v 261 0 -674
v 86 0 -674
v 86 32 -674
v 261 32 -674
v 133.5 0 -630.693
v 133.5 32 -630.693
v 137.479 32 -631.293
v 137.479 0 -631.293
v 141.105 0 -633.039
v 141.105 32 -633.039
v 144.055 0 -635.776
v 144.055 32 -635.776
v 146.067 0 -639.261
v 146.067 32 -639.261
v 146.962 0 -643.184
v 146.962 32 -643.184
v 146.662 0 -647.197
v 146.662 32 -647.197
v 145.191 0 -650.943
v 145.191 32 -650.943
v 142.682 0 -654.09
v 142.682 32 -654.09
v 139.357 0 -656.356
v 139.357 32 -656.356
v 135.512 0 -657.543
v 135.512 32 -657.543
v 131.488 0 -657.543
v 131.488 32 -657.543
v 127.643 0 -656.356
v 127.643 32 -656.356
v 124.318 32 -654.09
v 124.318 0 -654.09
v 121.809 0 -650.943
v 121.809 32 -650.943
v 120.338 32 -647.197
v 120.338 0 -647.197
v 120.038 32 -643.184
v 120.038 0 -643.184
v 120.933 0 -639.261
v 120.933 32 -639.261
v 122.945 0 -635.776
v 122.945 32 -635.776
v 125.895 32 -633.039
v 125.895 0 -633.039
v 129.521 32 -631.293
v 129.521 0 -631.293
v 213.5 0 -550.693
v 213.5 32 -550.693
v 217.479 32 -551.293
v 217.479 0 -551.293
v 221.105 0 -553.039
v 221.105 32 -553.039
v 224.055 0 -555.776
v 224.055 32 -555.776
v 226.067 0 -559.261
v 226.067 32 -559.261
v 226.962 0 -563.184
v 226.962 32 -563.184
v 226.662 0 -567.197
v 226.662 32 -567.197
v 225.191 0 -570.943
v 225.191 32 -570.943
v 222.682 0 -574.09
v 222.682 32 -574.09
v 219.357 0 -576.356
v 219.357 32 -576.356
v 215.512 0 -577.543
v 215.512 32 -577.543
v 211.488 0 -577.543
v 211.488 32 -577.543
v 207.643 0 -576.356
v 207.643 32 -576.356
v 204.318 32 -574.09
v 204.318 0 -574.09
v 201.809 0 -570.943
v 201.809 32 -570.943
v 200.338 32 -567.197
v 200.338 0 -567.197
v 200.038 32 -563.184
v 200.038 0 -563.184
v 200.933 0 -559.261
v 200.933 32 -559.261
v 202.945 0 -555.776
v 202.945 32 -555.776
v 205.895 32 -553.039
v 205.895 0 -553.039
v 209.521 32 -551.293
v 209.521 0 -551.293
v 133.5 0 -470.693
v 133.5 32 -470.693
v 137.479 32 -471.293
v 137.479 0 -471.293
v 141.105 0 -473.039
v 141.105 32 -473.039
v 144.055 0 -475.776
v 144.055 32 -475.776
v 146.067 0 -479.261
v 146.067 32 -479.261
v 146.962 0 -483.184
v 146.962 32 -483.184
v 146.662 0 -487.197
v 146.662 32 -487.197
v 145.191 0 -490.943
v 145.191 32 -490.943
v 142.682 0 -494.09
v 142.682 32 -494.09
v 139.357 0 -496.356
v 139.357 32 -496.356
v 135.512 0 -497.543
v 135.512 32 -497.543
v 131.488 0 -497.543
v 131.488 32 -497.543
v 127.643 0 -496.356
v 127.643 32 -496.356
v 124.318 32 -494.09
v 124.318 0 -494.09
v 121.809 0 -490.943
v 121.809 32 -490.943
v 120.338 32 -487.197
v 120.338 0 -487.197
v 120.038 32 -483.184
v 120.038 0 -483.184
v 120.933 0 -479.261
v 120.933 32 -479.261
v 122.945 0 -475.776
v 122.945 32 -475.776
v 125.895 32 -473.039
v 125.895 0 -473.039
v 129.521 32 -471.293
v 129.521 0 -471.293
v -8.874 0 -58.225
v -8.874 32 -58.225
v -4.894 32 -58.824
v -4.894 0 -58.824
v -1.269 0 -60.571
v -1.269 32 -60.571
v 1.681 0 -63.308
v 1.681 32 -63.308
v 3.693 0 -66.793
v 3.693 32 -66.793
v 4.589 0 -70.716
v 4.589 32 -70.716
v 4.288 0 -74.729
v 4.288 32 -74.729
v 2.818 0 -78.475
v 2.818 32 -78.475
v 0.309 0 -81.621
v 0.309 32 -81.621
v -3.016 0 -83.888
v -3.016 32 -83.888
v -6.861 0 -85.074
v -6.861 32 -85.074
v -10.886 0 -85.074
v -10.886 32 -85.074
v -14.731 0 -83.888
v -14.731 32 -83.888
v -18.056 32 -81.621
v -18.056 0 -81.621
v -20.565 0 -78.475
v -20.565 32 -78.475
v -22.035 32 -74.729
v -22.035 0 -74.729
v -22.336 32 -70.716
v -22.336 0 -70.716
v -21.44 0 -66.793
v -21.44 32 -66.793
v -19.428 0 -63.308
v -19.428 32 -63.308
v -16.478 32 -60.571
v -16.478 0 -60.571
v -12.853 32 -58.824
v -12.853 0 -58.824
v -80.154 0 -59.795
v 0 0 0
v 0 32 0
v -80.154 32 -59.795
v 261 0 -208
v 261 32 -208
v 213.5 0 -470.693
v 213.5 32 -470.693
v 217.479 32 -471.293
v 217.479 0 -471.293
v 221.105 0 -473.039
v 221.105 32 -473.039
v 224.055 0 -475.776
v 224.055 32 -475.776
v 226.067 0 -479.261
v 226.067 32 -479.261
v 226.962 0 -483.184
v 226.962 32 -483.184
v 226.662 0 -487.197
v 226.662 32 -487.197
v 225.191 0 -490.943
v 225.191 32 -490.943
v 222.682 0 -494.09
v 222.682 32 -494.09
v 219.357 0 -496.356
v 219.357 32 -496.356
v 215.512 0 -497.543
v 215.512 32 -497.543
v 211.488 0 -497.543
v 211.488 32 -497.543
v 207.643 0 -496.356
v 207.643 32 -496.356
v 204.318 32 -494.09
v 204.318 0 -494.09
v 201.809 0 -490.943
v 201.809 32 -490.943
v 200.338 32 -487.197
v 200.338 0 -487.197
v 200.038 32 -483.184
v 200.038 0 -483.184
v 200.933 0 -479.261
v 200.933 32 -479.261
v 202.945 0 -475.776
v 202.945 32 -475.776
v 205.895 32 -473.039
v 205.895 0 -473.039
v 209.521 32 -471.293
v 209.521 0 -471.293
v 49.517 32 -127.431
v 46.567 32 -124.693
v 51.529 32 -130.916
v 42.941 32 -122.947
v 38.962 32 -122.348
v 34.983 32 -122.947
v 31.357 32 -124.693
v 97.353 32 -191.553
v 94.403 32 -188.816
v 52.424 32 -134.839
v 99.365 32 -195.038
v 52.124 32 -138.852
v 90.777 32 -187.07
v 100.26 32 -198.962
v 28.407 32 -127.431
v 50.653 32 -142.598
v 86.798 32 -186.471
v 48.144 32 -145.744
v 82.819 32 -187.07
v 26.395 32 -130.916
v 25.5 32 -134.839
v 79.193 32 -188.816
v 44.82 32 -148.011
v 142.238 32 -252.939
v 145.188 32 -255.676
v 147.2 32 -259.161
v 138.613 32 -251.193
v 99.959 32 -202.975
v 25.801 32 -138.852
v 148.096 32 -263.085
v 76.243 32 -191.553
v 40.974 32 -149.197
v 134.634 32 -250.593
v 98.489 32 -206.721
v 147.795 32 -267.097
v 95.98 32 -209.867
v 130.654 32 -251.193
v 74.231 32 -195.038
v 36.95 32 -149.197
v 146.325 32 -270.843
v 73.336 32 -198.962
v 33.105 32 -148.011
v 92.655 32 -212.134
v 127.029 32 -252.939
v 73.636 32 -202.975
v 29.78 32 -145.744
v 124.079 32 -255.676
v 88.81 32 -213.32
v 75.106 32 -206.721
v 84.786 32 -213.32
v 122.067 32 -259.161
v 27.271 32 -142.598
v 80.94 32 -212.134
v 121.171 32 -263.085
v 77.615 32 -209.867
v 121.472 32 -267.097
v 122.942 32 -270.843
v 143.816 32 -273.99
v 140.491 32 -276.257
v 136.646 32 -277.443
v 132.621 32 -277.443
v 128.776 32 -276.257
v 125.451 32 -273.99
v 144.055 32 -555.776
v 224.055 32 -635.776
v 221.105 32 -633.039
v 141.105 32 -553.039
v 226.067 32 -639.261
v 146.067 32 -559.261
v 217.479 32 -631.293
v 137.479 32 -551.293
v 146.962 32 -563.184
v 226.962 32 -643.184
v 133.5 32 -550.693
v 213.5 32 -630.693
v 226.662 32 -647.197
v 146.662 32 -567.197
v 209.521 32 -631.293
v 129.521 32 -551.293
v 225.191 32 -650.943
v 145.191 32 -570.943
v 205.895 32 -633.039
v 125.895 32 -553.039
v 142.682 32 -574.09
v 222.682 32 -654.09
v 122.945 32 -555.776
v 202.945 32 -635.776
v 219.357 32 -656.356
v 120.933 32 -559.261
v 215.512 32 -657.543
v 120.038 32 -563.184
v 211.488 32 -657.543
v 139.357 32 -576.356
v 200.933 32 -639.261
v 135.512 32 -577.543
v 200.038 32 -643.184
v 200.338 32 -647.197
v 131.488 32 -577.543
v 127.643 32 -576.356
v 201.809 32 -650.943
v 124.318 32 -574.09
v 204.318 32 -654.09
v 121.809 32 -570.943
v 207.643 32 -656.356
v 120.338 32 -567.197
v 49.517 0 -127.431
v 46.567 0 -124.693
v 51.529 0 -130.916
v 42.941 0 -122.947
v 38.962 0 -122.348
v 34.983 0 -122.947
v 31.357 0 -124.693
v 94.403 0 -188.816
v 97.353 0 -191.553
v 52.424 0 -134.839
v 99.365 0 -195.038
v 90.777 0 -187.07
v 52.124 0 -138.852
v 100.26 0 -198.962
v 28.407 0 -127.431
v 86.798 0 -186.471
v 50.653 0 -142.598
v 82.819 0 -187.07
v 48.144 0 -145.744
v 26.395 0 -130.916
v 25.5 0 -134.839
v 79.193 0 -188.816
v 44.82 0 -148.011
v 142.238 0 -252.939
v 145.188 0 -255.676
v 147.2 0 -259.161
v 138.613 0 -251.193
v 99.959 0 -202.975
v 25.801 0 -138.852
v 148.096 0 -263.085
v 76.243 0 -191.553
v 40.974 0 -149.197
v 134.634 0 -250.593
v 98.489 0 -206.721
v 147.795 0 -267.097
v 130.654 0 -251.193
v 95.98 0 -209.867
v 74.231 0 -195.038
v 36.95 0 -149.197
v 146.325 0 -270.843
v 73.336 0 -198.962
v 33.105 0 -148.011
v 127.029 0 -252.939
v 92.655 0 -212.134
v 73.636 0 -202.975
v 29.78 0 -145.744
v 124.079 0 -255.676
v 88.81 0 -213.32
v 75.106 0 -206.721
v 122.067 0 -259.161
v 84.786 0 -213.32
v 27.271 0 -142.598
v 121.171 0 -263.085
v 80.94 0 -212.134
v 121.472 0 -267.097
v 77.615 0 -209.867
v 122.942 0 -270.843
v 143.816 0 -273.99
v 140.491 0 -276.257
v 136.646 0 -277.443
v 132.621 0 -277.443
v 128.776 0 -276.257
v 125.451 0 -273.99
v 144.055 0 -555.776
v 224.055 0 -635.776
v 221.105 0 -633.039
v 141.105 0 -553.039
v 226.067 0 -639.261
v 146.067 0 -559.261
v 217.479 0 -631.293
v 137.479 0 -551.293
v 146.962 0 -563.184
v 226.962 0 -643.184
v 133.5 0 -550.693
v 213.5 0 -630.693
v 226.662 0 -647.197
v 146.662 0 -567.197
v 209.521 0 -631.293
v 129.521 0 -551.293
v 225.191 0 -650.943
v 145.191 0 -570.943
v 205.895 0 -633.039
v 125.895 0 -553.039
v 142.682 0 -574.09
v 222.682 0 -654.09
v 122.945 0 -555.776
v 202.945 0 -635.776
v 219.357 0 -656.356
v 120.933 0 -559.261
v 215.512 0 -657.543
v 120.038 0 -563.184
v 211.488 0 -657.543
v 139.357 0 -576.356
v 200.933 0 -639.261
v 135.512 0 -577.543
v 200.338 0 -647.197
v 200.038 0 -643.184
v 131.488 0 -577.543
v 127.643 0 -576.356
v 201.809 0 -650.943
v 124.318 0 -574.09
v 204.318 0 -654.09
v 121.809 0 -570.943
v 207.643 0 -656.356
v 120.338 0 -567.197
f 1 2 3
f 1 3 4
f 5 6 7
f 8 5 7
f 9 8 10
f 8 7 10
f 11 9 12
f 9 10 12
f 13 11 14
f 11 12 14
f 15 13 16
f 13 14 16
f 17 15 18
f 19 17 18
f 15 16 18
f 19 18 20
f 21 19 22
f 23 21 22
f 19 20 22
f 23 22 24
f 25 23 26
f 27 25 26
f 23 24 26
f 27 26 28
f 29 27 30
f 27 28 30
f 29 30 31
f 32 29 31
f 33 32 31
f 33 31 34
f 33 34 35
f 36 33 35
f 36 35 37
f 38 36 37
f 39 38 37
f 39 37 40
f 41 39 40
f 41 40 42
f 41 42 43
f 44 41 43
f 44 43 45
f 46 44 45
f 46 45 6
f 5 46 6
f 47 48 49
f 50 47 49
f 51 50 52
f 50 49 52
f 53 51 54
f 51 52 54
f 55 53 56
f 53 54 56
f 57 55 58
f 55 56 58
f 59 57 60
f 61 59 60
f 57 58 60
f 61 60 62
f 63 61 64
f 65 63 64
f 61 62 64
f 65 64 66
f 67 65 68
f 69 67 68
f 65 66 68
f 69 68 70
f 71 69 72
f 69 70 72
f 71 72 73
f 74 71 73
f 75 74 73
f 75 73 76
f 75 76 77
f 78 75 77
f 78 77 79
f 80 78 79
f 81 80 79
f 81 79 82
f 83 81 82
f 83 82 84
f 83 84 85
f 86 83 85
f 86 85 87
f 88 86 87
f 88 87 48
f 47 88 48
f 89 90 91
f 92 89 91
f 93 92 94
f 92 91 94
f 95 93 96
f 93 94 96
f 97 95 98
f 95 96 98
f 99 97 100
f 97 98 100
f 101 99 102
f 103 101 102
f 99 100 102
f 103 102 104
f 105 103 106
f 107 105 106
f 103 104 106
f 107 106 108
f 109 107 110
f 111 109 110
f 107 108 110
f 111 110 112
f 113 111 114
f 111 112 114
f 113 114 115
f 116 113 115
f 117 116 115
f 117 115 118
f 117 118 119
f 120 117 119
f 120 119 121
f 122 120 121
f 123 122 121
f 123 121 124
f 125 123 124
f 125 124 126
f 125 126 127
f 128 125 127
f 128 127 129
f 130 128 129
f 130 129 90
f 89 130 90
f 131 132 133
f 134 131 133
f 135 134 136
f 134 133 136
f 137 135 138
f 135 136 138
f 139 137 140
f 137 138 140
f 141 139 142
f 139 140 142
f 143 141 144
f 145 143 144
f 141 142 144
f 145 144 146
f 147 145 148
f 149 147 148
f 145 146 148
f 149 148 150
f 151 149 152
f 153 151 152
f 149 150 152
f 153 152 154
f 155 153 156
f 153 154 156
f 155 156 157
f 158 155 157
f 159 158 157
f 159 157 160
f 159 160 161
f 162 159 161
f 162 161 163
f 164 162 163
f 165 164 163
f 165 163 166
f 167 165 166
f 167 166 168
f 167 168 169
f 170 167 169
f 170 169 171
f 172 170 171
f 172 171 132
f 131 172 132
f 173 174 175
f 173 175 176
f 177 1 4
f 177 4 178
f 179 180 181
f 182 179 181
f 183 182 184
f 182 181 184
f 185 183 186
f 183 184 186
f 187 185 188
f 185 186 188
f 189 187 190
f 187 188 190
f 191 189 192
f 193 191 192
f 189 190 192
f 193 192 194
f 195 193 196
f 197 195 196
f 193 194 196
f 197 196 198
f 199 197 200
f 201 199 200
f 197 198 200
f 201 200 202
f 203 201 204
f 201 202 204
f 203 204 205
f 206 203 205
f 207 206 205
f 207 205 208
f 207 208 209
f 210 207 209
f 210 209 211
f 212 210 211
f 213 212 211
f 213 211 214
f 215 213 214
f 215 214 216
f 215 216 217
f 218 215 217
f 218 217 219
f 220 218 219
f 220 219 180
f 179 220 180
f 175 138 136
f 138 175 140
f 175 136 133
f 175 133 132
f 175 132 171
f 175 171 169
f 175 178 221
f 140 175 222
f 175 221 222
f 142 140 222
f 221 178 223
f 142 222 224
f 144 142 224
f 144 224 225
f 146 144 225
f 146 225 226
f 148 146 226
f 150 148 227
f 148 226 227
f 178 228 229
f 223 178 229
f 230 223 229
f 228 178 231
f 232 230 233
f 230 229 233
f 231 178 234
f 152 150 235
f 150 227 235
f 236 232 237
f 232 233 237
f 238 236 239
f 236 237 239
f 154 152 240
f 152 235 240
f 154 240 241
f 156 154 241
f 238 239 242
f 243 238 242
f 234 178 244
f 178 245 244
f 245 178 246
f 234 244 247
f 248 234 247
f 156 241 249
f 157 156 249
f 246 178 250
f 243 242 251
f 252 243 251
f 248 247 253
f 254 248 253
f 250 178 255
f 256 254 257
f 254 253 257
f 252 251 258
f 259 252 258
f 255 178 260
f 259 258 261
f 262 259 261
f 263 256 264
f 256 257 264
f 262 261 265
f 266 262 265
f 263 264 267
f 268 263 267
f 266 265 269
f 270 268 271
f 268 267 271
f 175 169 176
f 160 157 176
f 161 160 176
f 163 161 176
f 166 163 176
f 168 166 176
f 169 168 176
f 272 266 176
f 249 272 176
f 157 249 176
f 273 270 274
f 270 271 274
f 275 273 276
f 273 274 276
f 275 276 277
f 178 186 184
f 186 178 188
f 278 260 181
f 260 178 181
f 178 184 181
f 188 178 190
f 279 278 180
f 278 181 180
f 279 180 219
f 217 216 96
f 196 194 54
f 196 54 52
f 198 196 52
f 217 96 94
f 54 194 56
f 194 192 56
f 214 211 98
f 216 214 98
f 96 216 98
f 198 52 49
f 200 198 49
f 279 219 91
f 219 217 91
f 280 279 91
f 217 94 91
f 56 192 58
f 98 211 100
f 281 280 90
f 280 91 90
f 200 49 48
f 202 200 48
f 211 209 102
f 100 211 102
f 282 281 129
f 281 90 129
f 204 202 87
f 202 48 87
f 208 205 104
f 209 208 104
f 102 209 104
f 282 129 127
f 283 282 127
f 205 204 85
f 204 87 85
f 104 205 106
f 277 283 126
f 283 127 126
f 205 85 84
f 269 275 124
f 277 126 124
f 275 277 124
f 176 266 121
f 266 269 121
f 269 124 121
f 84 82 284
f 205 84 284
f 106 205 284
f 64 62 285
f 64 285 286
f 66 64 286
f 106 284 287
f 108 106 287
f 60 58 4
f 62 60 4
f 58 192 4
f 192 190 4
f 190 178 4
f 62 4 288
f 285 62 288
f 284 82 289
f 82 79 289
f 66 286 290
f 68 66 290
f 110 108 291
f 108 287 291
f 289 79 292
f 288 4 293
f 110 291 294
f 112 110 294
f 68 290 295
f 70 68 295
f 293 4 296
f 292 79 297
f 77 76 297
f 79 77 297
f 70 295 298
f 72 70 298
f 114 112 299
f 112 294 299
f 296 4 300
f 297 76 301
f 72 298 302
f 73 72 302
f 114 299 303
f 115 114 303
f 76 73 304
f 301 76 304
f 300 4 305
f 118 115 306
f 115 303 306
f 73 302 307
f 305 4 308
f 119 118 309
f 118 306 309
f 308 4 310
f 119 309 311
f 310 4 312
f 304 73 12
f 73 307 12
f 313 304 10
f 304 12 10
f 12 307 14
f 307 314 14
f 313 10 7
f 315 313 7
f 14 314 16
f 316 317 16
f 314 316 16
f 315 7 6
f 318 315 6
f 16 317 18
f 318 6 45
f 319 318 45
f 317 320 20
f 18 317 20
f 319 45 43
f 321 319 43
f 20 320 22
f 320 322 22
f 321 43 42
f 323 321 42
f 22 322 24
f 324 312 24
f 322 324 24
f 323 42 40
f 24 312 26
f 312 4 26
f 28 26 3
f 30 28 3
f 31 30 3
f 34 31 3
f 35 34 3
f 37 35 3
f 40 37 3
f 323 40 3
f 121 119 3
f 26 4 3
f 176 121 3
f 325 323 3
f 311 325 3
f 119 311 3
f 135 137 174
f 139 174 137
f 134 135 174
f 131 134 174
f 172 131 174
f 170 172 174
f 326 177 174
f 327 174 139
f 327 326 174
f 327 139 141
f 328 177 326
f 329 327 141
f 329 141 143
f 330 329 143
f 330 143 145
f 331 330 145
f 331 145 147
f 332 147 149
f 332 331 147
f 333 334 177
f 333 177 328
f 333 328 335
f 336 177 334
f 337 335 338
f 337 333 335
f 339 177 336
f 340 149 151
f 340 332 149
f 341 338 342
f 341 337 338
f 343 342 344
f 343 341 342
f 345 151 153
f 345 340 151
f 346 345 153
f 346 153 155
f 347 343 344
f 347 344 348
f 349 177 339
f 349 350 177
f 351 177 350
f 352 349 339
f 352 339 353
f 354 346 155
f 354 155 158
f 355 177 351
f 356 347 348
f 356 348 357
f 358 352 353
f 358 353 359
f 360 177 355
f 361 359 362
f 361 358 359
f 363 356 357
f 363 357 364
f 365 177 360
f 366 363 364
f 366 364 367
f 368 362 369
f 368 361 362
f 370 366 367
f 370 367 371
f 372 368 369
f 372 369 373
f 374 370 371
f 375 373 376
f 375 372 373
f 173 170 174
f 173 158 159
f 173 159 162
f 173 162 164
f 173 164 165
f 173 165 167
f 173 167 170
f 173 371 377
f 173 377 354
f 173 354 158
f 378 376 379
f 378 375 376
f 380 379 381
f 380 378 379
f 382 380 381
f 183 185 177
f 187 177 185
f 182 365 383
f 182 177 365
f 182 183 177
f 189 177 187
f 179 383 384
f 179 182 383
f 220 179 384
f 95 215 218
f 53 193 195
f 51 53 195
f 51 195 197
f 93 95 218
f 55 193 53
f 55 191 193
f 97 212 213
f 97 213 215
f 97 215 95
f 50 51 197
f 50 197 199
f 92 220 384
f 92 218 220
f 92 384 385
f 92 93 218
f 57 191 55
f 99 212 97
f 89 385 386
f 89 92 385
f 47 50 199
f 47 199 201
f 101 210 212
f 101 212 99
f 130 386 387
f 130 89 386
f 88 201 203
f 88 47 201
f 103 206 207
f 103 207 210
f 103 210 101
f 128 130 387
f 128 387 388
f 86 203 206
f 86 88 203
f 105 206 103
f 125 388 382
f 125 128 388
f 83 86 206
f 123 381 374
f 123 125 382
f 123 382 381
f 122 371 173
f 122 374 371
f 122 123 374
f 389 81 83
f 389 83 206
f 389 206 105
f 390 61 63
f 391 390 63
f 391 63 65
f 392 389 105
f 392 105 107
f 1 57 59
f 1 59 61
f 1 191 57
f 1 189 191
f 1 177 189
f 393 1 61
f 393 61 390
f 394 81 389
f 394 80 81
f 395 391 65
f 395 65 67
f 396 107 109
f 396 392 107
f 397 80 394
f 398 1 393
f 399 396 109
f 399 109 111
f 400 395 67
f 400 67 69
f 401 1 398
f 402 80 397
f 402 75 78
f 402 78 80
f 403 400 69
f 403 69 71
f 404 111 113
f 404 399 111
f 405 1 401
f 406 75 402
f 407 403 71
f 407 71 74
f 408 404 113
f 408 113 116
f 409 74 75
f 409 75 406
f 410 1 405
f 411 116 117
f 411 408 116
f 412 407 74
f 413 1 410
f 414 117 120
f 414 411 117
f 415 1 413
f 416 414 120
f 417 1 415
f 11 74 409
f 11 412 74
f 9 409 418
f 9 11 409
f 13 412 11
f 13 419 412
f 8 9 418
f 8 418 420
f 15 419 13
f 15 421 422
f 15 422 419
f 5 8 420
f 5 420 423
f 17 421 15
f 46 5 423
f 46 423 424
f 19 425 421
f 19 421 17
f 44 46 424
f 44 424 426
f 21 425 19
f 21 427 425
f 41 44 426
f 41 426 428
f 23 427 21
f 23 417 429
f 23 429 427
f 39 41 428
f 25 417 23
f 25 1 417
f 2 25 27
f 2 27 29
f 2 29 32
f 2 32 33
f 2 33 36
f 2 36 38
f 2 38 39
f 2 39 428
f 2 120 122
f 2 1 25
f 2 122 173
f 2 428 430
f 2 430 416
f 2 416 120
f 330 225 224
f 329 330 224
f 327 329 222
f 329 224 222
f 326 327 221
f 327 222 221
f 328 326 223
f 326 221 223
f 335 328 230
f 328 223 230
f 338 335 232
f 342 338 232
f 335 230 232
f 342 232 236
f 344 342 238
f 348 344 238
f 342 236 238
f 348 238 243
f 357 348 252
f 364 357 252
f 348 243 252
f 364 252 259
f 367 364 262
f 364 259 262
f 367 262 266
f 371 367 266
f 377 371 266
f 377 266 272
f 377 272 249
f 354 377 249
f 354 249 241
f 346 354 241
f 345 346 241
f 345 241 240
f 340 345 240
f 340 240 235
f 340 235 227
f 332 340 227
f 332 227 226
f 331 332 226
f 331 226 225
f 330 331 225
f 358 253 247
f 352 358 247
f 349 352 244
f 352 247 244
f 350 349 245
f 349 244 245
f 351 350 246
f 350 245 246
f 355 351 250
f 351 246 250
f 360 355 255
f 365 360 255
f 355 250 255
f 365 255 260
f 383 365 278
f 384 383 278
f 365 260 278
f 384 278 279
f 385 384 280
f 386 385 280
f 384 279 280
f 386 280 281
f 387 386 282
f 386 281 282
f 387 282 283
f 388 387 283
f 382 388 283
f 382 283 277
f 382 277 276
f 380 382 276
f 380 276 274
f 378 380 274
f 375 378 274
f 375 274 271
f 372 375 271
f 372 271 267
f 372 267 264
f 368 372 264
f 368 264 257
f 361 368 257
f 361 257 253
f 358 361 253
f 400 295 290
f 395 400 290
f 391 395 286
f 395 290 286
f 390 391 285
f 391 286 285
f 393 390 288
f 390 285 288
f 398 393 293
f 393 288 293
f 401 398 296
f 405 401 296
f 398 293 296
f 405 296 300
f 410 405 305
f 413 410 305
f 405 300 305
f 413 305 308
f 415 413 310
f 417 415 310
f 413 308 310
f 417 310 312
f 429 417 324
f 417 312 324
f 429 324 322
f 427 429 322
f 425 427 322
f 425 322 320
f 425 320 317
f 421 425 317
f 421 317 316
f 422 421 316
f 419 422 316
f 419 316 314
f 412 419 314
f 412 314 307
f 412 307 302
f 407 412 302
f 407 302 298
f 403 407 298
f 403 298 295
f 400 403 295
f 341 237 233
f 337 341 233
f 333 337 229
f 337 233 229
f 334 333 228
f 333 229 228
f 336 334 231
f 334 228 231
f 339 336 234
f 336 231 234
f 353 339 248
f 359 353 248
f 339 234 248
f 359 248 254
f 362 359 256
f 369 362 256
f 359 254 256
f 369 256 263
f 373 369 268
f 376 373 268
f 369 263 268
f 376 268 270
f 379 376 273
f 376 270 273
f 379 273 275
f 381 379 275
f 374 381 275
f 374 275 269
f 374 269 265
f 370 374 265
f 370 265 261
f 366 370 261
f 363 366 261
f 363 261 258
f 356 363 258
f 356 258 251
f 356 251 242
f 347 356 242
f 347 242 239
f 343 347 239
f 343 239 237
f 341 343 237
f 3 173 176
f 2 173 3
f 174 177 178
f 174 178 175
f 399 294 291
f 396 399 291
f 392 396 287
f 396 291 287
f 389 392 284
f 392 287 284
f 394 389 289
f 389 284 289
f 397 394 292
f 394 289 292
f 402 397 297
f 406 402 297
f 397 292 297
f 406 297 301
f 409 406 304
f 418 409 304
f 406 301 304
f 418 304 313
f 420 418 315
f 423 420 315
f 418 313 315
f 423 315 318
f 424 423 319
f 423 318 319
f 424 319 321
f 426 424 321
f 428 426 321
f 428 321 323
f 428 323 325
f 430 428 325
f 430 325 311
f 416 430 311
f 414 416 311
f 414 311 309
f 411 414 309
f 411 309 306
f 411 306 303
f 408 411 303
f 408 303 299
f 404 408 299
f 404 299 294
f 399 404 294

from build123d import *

# Parameters (mm, degrees)
EXTRUDE_1_DEPTH     = 32
SKETCH_2_R          = 13.5
CUT_EXTRUDE_1_DEPTH = 724.478403271


with BuildPart() as part:
    # 草图1 → 凸台-拉伸1 (new body)
    with BuildSketch(Plane(origin=(0, 0, 0), x_dir=(1, 0, 0), z_dir=(0, 1, 0))):
        Polygon((-80.153631821, 59.794609338), (86, 674), (261, 674), (261, 208), (0, 0), align=None)
    extrude(amount=EXTRUDE_1_DEPTH)

    # 草图2 → 切除-拉伸1 (cut, through all)
    with BuildSketch(Plane(origin=(0, 32, 0), x_dir=(1, 0, 0), z_dir=(0, 1, 0))):
        with Locations(Location((133.5, 644.193304549, 0), (0, 0, 270))):
            Circle(SKETCH_2_R)
        with Locations(Location((213.5, 644.193304549, 0), (0, 0, 270))):
            Circle(SKETCH_2_R)
        with Locations(Location((133.5, 564.193304549, 0), (0, 0, 270))):
            Circle(SKETCH_2_R)
        with Locations(Location((213.5, 564.193304549, 0), (0, 0, 270))):
            Circle(SKETCH_2_R)
        with Locations(Location((133.5, 484.193304549, 0), (0, 0, 270))):
            Circle(SKETCH_2_R)
        with Locations(Location((213.5, 484.193304549, 0), (0, 0, 270))):
            Circle(SKETCH_2_R)
        with Locations(Location((134.63350393, 264.093443866, 0), (0, 0, 270))):
            Circle(SKETCH_2_R)
        with Locations(Location((-8.873558482, 71.724727496, 0), (0, 0, 270))):
            Circle(SKETCH_2_R)
        with Locations(Location((86.797816459, 199.970538409, 0), (0, 0, 270))):
            Circle(SKETCH_2_R)
        with Locations(Location((38.962128989, 135.847632952, 0), (0, 0, 270))):
            Circle(SKETCH_2_R)
    extrude(amount=-CUT_EXTRUDE_1_DEPTH, mode=Mode.SUBTRACT)


solid = part.part
